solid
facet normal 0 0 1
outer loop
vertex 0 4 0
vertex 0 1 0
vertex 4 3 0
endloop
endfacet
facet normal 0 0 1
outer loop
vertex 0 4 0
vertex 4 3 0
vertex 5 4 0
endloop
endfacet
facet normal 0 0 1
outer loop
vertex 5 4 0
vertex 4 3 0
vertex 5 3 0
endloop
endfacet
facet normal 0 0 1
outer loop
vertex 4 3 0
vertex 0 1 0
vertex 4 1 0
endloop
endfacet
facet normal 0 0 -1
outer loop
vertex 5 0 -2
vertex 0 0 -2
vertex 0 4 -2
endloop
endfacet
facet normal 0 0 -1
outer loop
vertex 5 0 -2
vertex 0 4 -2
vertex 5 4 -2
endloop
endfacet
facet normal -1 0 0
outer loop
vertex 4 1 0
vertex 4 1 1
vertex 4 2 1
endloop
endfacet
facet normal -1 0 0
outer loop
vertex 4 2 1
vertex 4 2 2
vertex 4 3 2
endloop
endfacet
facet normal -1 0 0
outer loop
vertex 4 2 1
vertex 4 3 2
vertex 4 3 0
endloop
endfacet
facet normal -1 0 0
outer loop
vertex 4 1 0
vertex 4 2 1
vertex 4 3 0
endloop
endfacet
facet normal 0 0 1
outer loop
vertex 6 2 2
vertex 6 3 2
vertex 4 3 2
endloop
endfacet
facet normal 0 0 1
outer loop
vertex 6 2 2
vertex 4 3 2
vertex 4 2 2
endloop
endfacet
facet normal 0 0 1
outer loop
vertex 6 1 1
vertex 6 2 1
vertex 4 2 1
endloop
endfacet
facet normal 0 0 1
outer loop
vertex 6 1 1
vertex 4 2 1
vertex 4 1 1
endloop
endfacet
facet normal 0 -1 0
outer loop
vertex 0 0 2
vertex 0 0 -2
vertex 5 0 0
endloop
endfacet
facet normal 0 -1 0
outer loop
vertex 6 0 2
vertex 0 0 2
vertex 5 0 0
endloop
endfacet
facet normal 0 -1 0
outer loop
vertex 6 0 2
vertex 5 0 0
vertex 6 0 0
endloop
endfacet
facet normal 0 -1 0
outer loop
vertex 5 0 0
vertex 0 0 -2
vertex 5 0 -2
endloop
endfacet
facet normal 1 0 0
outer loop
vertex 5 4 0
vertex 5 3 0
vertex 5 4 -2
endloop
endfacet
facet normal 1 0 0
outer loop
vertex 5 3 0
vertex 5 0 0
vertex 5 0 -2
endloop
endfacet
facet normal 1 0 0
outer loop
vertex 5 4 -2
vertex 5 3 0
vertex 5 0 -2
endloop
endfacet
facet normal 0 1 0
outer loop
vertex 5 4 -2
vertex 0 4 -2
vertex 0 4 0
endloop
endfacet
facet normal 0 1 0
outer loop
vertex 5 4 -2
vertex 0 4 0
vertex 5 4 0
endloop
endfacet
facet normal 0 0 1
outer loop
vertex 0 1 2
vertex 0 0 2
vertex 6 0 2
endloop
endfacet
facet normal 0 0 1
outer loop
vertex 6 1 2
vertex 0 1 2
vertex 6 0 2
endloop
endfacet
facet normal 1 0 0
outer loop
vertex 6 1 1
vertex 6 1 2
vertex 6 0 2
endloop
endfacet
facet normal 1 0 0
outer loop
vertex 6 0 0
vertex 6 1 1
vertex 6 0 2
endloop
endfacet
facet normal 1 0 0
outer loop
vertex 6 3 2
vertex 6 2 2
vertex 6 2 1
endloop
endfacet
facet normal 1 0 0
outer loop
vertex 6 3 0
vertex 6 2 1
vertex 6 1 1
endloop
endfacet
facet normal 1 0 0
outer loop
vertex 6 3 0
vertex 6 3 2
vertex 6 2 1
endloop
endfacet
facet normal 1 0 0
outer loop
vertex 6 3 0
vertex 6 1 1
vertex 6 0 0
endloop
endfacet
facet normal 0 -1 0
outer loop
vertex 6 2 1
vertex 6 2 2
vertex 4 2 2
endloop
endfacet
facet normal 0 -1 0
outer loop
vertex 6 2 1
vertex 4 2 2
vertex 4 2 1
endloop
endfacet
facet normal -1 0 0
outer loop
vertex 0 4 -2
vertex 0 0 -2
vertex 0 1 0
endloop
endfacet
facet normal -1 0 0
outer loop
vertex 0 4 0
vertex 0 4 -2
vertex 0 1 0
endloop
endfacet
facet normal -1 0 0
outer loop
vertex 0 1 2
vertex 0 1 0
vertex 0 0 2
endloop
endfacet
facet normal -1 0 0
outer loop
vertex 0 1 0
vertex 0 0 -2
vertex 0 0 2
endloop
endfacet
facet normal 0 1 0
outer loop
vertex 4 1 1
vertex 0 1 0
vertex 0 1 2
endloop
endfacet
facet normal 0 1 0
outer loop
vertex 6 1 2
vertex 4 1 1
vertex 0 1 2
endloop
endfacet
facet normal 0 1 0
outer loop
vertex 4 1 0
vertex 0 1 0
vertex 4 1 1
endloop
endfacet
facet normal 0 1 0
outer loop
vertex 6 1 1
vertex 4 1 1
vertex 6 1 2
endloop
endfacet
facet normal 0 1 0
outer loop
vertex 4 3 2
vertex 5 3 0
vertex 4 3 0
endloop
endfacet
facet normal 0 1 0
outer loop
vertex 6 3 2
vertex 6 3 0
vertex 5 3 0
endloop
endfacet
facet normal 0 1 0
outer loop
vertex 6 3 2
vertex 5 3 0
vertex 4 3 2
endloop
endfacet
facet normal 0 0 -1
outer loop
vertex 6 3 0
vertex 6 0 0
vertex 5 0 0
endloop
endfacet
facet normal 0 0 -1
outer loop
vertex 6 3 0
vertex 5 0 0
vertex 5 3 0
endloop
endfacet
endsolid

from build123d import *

# Parameters (mm, degrees)
SKETCH_1_W      = 5
SKETCH_1_H      = 2
EXTRUDE_1_DEPTH = 4
EXTRUDE_2_DEPTH = 1
EXTRUDE_3_DEPTH = 2


with BuildPart() as part:
    # 草圖1 → 填料-伸長1 (new body)
    with BuildSketch(Plane(origin=(0, 0, 0), x_dir=(1, 0, 0), z_dir=(0, 1, 0))):
        with Locations((2.5, 1)):
            Rectangle(SKETCH_1_W, SKETCH_1_H)
    extrude(amount=EXTRUDE_1_DEPTH)

    # 草圖1<3> → 填料-伸長2 (add)
    with BuildSketch(Plane(origin=(0, 0, 0), x_dir=(1, 0, 0), z_dir=(0, 1, 0))):
        Polygon((5, 0), (0, 0), (0, -2), (6, -2), (6, 0), align=None)
    extrude(amount=EXTRUDE_2_DEPTH)

    # 草圖2 → 填料-伸長3 (add)
    with BuildSketch(Plane(origin=(6, 0, 0), x_dir=(0, 0, -1), z_dir=(1, 0, 0))):
        Polygon((-1, 1), (0, 1), (0, 3), (-2, 3), (-2, 2), (-1, 2), align=None)
    extrude(amount=-EXTRUDE_3_DEPTH)


solid = part.part
